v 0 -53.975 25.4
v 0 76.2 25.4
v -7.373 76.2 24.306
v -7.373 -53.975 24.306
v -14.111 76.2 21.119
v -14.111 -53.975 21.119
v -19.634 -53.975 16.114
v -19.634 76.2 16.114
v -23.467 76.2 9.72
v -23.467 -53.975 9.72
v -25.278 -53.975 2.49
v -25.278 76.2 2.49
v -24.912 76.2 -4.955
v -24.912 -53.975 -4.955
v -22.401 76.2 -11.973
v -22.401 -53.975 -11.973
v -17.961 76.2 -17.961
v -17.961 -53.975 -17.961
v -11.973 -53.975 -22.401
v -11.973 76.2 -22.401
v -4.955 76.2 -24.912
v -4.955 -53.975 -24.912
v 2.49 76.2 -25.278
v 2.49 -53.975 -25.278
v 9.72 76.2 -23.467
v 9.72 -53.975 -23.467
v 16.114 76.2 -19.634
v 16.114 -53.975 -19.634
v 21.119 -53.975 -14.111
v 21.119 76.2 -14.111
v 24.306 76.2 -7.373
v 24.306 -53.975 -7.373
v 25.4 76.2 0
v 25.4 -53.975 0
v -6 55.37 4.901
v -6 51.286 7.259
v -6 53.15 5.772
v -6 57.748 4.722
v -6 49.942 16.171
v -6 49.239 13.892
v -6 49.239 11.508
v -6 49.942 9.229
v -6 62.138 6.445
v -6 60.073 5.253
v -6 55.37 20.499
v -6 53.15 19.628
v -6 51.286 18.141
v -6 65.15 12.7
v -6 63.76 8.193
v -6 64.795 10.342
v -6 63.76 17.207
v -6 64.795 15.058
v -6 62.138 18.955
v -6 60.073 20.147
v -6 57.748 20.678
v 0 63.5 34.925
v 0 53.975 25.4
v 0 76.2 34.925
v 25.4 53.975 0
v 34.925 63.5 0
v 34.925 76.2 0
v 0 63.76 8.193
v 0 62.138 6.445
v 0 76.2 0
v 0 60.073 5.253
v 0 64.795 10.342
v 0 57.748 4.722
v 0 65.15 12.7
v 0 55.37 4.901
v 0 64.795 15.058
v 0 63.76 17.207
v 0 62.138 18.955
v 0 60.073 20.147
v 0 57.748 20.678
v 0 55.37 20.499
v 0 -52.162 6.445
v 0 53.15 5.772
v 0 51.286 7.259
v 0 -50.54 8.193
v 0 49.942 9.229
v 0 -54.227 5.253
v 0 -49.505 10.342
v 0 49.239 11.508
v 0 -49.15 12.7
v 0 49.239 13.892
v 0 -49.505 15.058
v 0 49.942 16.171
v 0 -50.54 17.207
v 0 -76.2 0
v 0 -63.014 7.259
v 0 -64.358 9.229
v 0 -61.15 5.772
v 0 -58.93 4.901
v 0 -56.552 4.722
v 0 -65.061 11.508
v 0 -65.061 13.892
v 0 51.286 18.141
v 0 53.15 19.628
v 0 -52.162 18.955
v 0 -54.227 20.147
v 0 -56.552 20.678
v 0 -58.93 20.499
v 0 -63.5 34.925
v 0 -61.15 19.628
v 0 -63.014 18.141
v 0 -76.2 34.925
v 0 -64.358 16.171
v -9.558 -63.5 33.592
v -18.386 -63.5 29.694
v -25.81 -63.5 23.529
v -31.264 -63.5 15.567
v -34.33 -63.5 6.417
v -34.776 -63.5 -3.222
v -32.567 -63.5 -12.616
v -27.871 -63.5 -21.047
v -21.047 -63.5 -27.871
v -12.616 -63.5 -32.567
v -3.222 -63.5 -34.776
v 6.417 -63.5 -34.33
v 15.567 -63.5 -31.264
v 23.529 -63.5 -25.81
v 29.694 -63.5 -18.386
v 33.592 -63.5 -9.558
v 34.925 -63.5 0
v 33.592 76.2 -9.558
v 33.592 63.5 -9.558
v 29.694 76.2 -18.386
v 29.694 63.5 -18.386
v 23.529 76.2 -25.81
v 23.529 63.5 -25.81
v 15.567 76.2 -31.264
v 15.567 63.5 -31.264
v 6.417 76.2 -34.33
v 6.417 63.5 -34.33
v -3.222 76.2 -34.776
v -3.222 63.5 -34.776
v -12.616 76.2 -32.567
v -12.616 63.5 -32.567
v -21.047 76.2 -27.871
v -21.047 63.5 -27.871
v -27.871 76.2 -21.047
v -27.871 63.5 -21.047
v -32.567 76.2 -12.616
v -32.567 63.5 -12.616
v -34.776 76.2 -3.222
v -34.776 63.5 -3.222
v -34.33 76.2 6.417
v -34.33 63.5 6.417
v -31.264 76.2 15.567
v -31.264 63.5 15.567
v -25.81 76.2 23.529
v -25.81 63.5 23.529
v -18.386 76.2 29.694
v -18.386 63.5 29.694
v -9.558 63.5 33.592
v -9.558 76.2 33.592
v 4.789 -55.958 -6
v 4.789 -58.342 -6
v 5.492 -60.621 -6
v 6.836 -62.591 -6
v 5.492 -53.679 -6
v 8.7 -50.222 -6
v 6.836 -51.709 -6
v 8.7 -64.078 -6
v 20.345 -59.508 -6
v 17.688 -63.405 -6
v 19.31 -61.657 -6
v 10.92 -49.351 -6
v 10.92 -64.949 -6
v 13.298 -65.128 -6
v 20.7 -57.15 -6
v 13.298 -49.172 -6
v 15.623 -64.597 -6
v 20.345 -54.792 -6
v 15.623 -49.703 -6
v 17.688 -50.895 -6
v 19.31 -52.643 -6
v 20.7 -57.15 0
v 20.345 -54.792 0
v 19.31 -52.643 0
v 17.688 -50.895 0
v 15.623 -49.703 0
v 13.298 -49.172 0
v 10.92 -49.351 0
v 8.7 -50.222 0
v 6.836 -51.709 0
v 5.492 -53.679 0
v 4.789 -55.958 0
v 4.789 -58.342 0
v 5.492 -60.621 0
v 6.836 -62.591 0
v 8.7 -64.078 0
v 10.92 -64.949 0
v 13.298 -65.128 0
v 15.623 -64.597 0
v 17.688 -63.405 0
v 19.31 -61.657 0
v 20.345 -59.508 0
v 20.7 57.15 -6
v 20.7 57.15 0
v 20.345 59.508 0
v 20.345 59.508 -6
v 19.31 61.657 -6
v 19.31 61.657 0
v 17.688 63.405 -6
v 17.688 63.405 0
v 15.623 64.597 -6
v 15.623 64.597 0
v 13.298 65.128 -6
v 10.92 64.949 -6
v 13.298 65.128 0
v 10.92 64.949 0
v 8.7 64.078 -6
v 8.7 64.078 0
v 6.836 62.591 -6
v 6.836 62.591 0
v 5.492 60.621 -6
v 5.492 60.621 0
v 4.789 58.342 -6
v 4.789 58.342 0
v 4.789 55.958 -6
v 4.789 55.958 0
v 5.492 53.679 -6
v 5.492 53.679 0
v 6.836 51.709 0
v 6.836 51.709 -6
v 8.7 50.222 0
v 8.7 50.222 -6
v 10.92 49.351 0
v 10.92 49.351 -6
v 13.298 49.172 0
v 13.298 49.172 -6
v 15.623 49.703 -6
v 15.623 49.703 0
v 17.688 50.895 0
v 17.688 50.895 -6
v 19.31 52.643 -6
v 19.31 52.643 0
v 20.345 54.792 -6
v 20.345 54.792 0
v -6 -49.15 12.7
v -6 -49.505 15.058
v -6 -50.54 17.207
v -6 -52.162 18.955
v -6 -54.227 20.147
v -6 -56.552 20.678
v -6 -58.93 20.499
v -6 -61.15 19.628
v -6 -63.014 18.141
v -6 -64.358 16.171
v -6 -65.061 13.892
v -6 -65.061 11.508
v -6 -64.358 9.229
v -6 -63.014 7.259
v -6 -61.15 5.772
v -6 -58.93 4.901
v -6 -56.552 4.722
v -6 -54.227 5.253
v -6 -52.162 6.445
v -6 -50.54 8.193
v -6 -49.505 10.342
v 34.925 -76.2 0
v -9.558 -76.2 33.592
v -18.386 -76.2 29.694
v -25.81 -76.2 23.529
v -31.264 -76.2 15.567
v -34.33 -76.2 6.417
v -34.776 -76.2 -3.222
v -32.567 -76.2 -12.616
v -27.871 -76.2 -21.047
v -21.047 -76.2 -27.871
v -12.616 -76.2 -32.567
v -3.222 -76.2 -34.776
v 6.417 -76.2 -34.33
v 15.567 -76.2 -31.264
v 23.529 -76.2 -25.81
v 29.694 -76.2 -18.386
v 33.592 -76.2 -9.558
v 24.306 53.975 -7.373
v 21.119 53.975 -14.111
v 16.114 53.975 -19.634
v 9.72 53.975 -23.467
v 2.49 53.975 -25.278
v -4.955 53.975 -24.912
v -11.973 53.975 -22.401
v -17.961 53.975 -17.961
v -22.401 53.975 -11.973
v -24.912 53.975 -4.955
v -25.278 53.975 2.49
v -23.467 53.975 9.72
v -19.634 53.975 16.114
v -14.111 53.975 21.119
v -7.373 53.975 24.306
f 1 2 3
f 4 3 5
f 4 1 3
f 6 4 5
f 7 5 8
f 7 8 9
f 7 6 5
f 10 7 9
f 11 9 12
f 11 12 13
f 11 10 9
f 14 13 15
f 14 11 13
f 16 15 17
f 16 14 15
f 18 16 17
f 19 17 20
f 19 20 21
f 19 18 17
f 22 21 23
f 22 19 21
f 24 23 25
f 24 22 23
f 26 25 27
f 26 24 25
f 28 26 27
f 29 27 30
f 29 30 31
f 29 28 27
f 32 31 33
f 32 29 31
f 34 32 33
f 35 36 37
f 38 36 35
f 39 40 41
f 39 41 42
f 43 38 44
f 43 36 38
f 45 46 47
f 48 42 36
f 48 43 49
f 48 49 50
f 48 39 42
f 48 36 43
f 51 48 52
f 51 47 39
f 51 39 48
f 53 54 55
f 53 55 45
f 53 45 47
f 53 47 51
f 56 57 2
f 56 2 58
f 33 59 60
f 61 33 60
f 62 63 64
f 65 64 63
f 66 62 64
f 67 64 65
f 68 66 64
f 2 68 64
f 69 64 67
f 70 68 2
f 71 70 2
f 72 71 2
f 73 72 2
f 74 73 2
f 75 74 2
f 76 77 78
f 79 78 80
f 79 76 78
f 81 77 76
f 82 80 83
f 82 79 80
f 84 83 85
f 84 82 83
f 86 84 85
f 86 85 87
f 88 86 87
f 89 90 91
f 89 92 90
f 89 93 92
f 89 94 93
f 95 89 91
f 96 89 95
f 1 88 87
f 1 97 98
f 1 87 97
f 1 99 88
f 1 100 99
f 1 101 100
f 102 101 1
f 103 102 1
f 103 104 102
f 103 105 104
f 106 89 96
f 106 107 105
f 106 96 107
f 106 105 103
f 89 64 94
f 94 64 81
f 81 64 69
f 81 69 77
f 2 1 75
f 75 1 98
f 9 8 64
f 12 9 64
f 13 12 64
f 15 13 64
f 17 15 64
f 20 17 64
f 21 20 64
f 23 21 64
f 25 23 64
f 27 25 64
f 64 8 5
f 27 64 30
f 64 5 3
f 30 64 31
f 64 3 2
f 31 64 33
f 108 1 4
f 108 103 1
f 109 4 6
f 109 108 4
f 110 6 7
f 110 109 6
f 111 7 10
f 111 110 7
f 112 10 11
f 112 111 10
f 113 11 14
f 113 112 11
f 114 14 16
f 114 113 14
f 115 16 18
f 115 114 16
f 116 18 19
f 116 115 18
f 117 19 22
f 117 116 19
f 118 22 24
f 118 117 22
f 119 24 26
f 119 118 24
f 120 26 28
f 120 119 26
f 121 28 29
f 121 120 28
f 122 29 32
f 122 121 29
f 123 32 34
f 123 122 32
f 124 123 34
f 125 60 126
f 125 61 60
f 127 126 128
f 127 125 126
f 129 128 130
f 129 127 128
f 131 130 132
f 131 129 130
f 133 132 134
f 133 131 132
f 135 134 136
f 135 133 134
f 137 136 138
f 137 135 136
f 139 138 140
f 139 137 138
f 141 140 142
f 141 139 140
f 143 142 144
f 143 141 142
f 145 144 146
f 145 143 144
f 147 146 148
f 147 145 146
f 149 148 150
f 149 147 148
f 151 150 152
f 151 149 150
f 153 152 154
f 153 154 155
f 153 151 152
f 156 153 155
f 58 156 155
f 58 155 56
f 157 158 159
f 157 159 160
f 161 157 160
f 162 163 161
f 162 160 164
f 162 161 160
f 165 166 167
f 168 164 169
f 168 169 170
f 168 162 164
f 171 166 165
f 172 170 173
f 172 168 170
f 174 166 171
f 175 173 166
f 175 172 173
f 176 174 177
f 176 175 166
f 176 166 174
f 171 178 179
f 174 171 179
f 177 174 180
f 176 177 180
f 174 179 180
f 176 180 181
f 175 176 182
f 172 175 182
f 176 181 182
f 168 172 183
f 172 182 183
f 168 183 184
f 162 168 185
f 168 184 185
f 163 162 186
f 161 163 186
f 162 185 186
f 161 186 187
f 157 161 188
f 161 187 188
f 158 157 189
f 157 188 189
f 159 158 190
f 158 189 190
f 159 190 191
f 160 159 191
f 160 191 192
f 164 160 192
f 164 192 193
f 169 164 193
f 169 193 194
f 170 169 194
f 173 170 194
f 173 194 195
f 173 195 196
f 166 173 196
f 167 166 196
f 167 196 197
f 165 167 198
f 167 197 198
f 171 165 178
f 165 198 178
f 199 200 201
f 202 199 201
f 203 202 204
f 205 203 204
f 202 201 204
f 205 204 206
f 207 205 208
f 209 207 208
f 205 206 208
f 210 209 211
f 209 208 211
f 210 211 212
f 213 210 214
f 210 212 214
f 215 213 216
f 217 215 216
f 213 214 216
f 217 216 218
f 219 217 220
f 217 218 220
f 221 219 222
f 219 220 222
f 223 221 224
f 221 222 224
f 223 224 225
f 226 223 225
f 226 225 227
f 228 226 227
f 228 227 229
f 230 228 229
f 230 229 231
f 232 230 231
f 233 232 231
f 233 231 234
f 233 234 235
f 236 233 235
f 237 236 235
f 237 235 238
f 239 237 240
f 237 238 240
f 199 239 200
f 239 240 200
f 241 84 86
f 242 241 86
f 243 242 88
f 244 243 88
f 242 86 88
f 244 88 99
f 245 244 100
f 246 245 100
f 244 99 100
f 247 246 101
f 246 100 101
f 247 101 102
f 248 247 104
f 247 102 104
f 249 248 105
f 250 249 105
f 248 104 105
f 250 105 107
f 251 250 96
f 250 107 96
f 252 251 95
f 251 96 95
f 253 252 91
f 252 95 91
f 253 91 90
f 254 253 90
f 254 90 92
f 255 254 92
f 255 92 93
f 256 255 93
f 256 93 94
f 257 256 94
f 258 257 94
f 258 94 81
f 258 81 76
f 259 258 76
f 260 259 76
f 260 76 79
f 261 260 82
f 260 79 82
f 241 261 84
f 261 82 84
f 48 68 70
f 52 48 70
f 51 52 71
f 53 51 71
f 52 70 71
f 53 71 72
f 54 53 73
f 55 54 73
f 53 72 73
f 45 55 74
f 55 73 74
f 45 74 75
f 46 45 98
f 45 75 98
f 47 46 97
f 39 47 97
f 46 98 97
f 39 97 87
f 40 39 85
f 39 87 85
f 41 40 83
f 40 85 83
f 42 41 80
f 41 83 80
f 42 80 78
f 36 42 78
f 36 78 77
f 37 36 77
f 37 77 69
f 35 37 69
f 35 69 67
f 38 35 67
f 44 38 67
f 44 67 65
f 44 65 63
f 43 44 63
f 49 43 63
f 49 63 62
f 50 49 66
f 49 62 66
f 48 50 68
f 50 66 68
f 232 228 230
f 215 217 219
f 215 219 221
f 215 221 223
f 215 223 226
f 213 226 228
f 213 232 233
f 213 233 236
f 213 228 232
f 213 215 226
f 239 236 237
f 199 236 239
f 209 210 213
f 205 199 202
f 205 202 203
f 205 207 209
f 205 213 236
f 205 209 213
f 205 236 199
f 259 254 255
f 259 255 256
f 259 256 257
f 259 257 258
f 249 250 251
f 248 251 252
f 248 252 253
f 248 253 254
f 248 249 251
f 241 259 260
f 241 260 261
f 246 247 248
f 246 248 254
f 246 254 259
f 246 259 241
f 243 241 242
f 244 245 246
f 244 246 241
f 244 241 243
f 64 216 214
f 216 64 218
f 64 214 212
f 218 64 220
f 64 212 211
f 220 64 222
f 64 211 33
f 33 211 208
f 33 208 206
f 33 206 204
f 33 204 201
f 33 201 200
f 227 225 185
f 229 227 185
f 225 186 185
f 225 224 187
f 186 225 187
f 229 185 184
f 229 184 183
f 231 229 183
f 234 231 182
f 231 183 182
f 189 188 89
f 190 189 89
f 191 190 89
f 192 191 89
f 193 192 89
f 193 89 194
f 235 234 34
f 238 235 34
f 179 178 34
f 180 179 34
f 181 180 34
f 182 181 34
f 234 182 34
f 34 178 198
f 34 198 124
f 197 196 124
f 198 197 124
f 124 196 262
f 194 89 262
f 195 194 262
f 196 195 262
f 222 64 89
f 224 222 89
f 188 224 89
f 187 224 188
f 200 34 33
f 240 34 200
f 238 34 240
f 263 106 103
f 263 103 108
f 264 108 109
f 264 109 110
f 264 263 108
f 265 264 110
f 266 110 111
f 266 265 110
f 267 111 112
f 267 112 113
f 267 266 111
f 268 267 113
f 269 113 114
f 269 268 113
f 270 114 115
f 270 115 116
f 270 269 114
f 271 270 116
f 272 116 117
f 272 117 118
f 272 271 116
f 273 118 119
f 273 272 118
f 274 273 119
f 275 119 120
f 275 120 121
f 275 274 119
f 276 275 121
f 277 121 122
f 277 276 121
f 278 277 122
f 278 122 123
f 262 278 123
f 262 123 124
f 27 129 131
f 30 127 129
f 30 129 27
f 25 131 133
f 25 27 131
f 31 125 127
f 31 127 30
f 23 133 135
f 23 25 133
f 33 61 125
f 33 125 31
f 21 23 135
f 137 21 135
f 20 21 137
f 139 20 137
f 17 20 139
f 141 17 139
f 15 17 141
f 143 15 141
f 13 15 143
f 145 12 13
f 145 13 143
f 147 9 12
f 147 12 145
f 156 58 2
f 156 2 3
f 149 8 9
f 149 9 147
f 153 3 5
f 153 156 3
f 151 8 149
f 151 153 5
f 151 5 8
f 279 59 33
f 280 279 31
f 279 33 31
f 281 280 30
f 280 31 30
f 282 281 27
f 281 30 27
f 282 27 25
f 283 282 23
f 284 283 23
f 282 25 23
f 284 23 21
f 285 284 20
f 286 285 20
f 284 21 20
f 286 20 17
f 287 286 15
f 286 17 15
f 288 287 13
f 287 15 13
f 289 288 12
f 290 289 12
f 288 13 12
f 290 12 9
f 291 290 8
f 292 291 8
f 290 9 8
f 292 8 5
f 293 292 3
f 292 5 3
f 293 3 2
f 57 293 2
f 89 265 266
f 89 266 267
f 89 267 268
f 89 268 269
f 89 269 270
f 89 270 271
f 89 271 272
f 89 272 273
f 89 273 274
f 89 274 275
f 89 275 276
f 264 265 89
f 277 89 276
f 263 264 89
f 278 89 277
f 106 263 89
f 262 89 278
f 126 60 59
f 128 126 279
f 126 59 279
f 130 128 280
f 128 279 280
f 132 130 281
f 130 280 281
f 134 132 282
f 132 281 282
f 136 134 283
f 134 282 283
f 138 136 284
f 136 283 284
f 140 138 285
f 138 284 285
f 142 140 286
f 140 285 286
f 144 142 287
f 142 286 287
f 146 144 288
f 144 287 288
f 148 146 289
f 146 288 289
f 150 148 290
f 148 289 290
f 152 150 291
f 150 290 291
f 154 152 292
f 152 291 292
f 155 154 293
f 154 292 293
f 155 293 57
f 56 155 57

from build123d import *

# Parameters (mm, degrees)
F0_R          = 25.4
F1_DEPTH      = 76.2
F2_R          = 34.925
F2_R_2        = 25.4
F4_DEPTH      = 25.4
F3_R          = 34.925
F3_R_2        = 25.4
F5_DEPTH      = 25.4
F6_2_S5_R     = 25.4
F6_2_T6_DEPTH = 51
F7_W          = 48.0628833175
F7_H          = 48.6316718161
F8_DEPTH      = 88.9
F9_R          = 8
F10_DEPTH     = 6
F11_R         = 8
F12_DEPTH     = 6


# Not quite as in the source:
# - a fillet or chamfer that OpenCascade refuses, or shapes differently, is made with other operations: its cross-section is extruded or revolved along the edge and cut away or added


with BuildPart() as f1:
    # F0 (on Front) → F1 (new body, symmetric)
    with BuildSketch(Plane.XZ):
        Circle(F0_R)
    extrude(amount=F1_DEPTH, both=True)

    # F2 (on face) → F4 (join)
    with BuildSketch(Plane.XZ.offset(76.2)):
        Circle(F2_R)
        Circle(F2_R_2, mode=Mode.SUBTRACT)
    extrude(amount=-F4_DEPTH)

    # F6#2: chamfer of 12.7 on 1 edges, made by hand


with BuildPart() as f5:
    # F3 (on face) → F5 (new body)
    with BuildSketch(Plane(origin=(0, 76.2, 0), x_dir=(-1, 0, 0), z_dir=(0, 1, 0))):
        Circle(F3_R)
        Circle(F3_R_2, mode=Mode.SUBTRACT)
    extrude(amount=-F5_DEPTH)

    # F6: chamfer of 12.7 on 1 edges, made by hand

    # F6_s1 → F6_t2 (revolve, cut)
    with BuildSketch(Plane.XY):
        Polygon((-34.925, 63.5), (-22.225, 50.8), (-34.925, 50.8), align=None)
    revolve(axis=Axis((0, 50.8, 0), (0, 1, 0)), mode=Mode.SUBTRACT)


with BuildPart() as f6_2_tool2:
    # F6_2_s3 → F6_2_t4 (revolve)
    with BuildSketch(Plane.XY):
        Polygon((22.225, -50.8), (34.925, -63.5), (34.925, -50.8), align=None)
    revolve(axis=Axis((0, -50.8, 0), (0, -1, 0)))

    # F6_2_s5 → F6_2_t6 (cut, symmetric)
    with BuildSketch(Plane.XZ.offset(57.2)):
        Circle(F6_2_S5_R)
    extrude(amount=F6_2_T6_DEPTH, both=True, mode=Mode.SUBTRACT)


with BuildPart() as f1_1:
    add(f1.part)

    # F6_2_t1: cut F6_2_tool2
    add(f6_2_tool2.part, mode=Mode.SUBTRACT)


with BuildPart() as f8_tool:
    # F7 (on Front) → F8 (new body, symmetric)
    with BuildSketch(Plane.XZ):
        with Locations((24.0314416587, 24.3158359081)):
            Rectangle(F7_W, F7_H)
    extrude(amount=F8_DEPTH, both=True)


with BuildPart() as f1_2:
    add(f1_1.part)

    # F8: cut by f8_tool
    add(f8_tool.part, mode=Mode.SUBTRACT)

    # F9 (on face) → F10 (cut)
    with BuildSketch(Plane.YZ):
        with Locations((-57.15, 12.7)):
            Circle(F9_R)
        with Locations((57.15, 12.7)):
            Circle(F9_R)
    extrude(amount=-F10_DEPTH, mode=Mode.SUBTRACT)

    # F11 (on face) → F12 (cut)
    with BuildSketch(Plane.XY):
        with Locations((12.7, -57.15)):
            Circle(F11_R)
        with Locations((12.7, 57.15)):
            Circle(F11_R)
    extrude(amount=-F12_DEPTH, mode=Mode.SUBTRACT)


with BuildPart() as f5_1:
    add(f5.part)

    # F8: cut by f8_tool
    add(f8_tool.part, mode=Mode.SUBTRACT)


solid = Compound([f1_2.part, f5_1.part])
